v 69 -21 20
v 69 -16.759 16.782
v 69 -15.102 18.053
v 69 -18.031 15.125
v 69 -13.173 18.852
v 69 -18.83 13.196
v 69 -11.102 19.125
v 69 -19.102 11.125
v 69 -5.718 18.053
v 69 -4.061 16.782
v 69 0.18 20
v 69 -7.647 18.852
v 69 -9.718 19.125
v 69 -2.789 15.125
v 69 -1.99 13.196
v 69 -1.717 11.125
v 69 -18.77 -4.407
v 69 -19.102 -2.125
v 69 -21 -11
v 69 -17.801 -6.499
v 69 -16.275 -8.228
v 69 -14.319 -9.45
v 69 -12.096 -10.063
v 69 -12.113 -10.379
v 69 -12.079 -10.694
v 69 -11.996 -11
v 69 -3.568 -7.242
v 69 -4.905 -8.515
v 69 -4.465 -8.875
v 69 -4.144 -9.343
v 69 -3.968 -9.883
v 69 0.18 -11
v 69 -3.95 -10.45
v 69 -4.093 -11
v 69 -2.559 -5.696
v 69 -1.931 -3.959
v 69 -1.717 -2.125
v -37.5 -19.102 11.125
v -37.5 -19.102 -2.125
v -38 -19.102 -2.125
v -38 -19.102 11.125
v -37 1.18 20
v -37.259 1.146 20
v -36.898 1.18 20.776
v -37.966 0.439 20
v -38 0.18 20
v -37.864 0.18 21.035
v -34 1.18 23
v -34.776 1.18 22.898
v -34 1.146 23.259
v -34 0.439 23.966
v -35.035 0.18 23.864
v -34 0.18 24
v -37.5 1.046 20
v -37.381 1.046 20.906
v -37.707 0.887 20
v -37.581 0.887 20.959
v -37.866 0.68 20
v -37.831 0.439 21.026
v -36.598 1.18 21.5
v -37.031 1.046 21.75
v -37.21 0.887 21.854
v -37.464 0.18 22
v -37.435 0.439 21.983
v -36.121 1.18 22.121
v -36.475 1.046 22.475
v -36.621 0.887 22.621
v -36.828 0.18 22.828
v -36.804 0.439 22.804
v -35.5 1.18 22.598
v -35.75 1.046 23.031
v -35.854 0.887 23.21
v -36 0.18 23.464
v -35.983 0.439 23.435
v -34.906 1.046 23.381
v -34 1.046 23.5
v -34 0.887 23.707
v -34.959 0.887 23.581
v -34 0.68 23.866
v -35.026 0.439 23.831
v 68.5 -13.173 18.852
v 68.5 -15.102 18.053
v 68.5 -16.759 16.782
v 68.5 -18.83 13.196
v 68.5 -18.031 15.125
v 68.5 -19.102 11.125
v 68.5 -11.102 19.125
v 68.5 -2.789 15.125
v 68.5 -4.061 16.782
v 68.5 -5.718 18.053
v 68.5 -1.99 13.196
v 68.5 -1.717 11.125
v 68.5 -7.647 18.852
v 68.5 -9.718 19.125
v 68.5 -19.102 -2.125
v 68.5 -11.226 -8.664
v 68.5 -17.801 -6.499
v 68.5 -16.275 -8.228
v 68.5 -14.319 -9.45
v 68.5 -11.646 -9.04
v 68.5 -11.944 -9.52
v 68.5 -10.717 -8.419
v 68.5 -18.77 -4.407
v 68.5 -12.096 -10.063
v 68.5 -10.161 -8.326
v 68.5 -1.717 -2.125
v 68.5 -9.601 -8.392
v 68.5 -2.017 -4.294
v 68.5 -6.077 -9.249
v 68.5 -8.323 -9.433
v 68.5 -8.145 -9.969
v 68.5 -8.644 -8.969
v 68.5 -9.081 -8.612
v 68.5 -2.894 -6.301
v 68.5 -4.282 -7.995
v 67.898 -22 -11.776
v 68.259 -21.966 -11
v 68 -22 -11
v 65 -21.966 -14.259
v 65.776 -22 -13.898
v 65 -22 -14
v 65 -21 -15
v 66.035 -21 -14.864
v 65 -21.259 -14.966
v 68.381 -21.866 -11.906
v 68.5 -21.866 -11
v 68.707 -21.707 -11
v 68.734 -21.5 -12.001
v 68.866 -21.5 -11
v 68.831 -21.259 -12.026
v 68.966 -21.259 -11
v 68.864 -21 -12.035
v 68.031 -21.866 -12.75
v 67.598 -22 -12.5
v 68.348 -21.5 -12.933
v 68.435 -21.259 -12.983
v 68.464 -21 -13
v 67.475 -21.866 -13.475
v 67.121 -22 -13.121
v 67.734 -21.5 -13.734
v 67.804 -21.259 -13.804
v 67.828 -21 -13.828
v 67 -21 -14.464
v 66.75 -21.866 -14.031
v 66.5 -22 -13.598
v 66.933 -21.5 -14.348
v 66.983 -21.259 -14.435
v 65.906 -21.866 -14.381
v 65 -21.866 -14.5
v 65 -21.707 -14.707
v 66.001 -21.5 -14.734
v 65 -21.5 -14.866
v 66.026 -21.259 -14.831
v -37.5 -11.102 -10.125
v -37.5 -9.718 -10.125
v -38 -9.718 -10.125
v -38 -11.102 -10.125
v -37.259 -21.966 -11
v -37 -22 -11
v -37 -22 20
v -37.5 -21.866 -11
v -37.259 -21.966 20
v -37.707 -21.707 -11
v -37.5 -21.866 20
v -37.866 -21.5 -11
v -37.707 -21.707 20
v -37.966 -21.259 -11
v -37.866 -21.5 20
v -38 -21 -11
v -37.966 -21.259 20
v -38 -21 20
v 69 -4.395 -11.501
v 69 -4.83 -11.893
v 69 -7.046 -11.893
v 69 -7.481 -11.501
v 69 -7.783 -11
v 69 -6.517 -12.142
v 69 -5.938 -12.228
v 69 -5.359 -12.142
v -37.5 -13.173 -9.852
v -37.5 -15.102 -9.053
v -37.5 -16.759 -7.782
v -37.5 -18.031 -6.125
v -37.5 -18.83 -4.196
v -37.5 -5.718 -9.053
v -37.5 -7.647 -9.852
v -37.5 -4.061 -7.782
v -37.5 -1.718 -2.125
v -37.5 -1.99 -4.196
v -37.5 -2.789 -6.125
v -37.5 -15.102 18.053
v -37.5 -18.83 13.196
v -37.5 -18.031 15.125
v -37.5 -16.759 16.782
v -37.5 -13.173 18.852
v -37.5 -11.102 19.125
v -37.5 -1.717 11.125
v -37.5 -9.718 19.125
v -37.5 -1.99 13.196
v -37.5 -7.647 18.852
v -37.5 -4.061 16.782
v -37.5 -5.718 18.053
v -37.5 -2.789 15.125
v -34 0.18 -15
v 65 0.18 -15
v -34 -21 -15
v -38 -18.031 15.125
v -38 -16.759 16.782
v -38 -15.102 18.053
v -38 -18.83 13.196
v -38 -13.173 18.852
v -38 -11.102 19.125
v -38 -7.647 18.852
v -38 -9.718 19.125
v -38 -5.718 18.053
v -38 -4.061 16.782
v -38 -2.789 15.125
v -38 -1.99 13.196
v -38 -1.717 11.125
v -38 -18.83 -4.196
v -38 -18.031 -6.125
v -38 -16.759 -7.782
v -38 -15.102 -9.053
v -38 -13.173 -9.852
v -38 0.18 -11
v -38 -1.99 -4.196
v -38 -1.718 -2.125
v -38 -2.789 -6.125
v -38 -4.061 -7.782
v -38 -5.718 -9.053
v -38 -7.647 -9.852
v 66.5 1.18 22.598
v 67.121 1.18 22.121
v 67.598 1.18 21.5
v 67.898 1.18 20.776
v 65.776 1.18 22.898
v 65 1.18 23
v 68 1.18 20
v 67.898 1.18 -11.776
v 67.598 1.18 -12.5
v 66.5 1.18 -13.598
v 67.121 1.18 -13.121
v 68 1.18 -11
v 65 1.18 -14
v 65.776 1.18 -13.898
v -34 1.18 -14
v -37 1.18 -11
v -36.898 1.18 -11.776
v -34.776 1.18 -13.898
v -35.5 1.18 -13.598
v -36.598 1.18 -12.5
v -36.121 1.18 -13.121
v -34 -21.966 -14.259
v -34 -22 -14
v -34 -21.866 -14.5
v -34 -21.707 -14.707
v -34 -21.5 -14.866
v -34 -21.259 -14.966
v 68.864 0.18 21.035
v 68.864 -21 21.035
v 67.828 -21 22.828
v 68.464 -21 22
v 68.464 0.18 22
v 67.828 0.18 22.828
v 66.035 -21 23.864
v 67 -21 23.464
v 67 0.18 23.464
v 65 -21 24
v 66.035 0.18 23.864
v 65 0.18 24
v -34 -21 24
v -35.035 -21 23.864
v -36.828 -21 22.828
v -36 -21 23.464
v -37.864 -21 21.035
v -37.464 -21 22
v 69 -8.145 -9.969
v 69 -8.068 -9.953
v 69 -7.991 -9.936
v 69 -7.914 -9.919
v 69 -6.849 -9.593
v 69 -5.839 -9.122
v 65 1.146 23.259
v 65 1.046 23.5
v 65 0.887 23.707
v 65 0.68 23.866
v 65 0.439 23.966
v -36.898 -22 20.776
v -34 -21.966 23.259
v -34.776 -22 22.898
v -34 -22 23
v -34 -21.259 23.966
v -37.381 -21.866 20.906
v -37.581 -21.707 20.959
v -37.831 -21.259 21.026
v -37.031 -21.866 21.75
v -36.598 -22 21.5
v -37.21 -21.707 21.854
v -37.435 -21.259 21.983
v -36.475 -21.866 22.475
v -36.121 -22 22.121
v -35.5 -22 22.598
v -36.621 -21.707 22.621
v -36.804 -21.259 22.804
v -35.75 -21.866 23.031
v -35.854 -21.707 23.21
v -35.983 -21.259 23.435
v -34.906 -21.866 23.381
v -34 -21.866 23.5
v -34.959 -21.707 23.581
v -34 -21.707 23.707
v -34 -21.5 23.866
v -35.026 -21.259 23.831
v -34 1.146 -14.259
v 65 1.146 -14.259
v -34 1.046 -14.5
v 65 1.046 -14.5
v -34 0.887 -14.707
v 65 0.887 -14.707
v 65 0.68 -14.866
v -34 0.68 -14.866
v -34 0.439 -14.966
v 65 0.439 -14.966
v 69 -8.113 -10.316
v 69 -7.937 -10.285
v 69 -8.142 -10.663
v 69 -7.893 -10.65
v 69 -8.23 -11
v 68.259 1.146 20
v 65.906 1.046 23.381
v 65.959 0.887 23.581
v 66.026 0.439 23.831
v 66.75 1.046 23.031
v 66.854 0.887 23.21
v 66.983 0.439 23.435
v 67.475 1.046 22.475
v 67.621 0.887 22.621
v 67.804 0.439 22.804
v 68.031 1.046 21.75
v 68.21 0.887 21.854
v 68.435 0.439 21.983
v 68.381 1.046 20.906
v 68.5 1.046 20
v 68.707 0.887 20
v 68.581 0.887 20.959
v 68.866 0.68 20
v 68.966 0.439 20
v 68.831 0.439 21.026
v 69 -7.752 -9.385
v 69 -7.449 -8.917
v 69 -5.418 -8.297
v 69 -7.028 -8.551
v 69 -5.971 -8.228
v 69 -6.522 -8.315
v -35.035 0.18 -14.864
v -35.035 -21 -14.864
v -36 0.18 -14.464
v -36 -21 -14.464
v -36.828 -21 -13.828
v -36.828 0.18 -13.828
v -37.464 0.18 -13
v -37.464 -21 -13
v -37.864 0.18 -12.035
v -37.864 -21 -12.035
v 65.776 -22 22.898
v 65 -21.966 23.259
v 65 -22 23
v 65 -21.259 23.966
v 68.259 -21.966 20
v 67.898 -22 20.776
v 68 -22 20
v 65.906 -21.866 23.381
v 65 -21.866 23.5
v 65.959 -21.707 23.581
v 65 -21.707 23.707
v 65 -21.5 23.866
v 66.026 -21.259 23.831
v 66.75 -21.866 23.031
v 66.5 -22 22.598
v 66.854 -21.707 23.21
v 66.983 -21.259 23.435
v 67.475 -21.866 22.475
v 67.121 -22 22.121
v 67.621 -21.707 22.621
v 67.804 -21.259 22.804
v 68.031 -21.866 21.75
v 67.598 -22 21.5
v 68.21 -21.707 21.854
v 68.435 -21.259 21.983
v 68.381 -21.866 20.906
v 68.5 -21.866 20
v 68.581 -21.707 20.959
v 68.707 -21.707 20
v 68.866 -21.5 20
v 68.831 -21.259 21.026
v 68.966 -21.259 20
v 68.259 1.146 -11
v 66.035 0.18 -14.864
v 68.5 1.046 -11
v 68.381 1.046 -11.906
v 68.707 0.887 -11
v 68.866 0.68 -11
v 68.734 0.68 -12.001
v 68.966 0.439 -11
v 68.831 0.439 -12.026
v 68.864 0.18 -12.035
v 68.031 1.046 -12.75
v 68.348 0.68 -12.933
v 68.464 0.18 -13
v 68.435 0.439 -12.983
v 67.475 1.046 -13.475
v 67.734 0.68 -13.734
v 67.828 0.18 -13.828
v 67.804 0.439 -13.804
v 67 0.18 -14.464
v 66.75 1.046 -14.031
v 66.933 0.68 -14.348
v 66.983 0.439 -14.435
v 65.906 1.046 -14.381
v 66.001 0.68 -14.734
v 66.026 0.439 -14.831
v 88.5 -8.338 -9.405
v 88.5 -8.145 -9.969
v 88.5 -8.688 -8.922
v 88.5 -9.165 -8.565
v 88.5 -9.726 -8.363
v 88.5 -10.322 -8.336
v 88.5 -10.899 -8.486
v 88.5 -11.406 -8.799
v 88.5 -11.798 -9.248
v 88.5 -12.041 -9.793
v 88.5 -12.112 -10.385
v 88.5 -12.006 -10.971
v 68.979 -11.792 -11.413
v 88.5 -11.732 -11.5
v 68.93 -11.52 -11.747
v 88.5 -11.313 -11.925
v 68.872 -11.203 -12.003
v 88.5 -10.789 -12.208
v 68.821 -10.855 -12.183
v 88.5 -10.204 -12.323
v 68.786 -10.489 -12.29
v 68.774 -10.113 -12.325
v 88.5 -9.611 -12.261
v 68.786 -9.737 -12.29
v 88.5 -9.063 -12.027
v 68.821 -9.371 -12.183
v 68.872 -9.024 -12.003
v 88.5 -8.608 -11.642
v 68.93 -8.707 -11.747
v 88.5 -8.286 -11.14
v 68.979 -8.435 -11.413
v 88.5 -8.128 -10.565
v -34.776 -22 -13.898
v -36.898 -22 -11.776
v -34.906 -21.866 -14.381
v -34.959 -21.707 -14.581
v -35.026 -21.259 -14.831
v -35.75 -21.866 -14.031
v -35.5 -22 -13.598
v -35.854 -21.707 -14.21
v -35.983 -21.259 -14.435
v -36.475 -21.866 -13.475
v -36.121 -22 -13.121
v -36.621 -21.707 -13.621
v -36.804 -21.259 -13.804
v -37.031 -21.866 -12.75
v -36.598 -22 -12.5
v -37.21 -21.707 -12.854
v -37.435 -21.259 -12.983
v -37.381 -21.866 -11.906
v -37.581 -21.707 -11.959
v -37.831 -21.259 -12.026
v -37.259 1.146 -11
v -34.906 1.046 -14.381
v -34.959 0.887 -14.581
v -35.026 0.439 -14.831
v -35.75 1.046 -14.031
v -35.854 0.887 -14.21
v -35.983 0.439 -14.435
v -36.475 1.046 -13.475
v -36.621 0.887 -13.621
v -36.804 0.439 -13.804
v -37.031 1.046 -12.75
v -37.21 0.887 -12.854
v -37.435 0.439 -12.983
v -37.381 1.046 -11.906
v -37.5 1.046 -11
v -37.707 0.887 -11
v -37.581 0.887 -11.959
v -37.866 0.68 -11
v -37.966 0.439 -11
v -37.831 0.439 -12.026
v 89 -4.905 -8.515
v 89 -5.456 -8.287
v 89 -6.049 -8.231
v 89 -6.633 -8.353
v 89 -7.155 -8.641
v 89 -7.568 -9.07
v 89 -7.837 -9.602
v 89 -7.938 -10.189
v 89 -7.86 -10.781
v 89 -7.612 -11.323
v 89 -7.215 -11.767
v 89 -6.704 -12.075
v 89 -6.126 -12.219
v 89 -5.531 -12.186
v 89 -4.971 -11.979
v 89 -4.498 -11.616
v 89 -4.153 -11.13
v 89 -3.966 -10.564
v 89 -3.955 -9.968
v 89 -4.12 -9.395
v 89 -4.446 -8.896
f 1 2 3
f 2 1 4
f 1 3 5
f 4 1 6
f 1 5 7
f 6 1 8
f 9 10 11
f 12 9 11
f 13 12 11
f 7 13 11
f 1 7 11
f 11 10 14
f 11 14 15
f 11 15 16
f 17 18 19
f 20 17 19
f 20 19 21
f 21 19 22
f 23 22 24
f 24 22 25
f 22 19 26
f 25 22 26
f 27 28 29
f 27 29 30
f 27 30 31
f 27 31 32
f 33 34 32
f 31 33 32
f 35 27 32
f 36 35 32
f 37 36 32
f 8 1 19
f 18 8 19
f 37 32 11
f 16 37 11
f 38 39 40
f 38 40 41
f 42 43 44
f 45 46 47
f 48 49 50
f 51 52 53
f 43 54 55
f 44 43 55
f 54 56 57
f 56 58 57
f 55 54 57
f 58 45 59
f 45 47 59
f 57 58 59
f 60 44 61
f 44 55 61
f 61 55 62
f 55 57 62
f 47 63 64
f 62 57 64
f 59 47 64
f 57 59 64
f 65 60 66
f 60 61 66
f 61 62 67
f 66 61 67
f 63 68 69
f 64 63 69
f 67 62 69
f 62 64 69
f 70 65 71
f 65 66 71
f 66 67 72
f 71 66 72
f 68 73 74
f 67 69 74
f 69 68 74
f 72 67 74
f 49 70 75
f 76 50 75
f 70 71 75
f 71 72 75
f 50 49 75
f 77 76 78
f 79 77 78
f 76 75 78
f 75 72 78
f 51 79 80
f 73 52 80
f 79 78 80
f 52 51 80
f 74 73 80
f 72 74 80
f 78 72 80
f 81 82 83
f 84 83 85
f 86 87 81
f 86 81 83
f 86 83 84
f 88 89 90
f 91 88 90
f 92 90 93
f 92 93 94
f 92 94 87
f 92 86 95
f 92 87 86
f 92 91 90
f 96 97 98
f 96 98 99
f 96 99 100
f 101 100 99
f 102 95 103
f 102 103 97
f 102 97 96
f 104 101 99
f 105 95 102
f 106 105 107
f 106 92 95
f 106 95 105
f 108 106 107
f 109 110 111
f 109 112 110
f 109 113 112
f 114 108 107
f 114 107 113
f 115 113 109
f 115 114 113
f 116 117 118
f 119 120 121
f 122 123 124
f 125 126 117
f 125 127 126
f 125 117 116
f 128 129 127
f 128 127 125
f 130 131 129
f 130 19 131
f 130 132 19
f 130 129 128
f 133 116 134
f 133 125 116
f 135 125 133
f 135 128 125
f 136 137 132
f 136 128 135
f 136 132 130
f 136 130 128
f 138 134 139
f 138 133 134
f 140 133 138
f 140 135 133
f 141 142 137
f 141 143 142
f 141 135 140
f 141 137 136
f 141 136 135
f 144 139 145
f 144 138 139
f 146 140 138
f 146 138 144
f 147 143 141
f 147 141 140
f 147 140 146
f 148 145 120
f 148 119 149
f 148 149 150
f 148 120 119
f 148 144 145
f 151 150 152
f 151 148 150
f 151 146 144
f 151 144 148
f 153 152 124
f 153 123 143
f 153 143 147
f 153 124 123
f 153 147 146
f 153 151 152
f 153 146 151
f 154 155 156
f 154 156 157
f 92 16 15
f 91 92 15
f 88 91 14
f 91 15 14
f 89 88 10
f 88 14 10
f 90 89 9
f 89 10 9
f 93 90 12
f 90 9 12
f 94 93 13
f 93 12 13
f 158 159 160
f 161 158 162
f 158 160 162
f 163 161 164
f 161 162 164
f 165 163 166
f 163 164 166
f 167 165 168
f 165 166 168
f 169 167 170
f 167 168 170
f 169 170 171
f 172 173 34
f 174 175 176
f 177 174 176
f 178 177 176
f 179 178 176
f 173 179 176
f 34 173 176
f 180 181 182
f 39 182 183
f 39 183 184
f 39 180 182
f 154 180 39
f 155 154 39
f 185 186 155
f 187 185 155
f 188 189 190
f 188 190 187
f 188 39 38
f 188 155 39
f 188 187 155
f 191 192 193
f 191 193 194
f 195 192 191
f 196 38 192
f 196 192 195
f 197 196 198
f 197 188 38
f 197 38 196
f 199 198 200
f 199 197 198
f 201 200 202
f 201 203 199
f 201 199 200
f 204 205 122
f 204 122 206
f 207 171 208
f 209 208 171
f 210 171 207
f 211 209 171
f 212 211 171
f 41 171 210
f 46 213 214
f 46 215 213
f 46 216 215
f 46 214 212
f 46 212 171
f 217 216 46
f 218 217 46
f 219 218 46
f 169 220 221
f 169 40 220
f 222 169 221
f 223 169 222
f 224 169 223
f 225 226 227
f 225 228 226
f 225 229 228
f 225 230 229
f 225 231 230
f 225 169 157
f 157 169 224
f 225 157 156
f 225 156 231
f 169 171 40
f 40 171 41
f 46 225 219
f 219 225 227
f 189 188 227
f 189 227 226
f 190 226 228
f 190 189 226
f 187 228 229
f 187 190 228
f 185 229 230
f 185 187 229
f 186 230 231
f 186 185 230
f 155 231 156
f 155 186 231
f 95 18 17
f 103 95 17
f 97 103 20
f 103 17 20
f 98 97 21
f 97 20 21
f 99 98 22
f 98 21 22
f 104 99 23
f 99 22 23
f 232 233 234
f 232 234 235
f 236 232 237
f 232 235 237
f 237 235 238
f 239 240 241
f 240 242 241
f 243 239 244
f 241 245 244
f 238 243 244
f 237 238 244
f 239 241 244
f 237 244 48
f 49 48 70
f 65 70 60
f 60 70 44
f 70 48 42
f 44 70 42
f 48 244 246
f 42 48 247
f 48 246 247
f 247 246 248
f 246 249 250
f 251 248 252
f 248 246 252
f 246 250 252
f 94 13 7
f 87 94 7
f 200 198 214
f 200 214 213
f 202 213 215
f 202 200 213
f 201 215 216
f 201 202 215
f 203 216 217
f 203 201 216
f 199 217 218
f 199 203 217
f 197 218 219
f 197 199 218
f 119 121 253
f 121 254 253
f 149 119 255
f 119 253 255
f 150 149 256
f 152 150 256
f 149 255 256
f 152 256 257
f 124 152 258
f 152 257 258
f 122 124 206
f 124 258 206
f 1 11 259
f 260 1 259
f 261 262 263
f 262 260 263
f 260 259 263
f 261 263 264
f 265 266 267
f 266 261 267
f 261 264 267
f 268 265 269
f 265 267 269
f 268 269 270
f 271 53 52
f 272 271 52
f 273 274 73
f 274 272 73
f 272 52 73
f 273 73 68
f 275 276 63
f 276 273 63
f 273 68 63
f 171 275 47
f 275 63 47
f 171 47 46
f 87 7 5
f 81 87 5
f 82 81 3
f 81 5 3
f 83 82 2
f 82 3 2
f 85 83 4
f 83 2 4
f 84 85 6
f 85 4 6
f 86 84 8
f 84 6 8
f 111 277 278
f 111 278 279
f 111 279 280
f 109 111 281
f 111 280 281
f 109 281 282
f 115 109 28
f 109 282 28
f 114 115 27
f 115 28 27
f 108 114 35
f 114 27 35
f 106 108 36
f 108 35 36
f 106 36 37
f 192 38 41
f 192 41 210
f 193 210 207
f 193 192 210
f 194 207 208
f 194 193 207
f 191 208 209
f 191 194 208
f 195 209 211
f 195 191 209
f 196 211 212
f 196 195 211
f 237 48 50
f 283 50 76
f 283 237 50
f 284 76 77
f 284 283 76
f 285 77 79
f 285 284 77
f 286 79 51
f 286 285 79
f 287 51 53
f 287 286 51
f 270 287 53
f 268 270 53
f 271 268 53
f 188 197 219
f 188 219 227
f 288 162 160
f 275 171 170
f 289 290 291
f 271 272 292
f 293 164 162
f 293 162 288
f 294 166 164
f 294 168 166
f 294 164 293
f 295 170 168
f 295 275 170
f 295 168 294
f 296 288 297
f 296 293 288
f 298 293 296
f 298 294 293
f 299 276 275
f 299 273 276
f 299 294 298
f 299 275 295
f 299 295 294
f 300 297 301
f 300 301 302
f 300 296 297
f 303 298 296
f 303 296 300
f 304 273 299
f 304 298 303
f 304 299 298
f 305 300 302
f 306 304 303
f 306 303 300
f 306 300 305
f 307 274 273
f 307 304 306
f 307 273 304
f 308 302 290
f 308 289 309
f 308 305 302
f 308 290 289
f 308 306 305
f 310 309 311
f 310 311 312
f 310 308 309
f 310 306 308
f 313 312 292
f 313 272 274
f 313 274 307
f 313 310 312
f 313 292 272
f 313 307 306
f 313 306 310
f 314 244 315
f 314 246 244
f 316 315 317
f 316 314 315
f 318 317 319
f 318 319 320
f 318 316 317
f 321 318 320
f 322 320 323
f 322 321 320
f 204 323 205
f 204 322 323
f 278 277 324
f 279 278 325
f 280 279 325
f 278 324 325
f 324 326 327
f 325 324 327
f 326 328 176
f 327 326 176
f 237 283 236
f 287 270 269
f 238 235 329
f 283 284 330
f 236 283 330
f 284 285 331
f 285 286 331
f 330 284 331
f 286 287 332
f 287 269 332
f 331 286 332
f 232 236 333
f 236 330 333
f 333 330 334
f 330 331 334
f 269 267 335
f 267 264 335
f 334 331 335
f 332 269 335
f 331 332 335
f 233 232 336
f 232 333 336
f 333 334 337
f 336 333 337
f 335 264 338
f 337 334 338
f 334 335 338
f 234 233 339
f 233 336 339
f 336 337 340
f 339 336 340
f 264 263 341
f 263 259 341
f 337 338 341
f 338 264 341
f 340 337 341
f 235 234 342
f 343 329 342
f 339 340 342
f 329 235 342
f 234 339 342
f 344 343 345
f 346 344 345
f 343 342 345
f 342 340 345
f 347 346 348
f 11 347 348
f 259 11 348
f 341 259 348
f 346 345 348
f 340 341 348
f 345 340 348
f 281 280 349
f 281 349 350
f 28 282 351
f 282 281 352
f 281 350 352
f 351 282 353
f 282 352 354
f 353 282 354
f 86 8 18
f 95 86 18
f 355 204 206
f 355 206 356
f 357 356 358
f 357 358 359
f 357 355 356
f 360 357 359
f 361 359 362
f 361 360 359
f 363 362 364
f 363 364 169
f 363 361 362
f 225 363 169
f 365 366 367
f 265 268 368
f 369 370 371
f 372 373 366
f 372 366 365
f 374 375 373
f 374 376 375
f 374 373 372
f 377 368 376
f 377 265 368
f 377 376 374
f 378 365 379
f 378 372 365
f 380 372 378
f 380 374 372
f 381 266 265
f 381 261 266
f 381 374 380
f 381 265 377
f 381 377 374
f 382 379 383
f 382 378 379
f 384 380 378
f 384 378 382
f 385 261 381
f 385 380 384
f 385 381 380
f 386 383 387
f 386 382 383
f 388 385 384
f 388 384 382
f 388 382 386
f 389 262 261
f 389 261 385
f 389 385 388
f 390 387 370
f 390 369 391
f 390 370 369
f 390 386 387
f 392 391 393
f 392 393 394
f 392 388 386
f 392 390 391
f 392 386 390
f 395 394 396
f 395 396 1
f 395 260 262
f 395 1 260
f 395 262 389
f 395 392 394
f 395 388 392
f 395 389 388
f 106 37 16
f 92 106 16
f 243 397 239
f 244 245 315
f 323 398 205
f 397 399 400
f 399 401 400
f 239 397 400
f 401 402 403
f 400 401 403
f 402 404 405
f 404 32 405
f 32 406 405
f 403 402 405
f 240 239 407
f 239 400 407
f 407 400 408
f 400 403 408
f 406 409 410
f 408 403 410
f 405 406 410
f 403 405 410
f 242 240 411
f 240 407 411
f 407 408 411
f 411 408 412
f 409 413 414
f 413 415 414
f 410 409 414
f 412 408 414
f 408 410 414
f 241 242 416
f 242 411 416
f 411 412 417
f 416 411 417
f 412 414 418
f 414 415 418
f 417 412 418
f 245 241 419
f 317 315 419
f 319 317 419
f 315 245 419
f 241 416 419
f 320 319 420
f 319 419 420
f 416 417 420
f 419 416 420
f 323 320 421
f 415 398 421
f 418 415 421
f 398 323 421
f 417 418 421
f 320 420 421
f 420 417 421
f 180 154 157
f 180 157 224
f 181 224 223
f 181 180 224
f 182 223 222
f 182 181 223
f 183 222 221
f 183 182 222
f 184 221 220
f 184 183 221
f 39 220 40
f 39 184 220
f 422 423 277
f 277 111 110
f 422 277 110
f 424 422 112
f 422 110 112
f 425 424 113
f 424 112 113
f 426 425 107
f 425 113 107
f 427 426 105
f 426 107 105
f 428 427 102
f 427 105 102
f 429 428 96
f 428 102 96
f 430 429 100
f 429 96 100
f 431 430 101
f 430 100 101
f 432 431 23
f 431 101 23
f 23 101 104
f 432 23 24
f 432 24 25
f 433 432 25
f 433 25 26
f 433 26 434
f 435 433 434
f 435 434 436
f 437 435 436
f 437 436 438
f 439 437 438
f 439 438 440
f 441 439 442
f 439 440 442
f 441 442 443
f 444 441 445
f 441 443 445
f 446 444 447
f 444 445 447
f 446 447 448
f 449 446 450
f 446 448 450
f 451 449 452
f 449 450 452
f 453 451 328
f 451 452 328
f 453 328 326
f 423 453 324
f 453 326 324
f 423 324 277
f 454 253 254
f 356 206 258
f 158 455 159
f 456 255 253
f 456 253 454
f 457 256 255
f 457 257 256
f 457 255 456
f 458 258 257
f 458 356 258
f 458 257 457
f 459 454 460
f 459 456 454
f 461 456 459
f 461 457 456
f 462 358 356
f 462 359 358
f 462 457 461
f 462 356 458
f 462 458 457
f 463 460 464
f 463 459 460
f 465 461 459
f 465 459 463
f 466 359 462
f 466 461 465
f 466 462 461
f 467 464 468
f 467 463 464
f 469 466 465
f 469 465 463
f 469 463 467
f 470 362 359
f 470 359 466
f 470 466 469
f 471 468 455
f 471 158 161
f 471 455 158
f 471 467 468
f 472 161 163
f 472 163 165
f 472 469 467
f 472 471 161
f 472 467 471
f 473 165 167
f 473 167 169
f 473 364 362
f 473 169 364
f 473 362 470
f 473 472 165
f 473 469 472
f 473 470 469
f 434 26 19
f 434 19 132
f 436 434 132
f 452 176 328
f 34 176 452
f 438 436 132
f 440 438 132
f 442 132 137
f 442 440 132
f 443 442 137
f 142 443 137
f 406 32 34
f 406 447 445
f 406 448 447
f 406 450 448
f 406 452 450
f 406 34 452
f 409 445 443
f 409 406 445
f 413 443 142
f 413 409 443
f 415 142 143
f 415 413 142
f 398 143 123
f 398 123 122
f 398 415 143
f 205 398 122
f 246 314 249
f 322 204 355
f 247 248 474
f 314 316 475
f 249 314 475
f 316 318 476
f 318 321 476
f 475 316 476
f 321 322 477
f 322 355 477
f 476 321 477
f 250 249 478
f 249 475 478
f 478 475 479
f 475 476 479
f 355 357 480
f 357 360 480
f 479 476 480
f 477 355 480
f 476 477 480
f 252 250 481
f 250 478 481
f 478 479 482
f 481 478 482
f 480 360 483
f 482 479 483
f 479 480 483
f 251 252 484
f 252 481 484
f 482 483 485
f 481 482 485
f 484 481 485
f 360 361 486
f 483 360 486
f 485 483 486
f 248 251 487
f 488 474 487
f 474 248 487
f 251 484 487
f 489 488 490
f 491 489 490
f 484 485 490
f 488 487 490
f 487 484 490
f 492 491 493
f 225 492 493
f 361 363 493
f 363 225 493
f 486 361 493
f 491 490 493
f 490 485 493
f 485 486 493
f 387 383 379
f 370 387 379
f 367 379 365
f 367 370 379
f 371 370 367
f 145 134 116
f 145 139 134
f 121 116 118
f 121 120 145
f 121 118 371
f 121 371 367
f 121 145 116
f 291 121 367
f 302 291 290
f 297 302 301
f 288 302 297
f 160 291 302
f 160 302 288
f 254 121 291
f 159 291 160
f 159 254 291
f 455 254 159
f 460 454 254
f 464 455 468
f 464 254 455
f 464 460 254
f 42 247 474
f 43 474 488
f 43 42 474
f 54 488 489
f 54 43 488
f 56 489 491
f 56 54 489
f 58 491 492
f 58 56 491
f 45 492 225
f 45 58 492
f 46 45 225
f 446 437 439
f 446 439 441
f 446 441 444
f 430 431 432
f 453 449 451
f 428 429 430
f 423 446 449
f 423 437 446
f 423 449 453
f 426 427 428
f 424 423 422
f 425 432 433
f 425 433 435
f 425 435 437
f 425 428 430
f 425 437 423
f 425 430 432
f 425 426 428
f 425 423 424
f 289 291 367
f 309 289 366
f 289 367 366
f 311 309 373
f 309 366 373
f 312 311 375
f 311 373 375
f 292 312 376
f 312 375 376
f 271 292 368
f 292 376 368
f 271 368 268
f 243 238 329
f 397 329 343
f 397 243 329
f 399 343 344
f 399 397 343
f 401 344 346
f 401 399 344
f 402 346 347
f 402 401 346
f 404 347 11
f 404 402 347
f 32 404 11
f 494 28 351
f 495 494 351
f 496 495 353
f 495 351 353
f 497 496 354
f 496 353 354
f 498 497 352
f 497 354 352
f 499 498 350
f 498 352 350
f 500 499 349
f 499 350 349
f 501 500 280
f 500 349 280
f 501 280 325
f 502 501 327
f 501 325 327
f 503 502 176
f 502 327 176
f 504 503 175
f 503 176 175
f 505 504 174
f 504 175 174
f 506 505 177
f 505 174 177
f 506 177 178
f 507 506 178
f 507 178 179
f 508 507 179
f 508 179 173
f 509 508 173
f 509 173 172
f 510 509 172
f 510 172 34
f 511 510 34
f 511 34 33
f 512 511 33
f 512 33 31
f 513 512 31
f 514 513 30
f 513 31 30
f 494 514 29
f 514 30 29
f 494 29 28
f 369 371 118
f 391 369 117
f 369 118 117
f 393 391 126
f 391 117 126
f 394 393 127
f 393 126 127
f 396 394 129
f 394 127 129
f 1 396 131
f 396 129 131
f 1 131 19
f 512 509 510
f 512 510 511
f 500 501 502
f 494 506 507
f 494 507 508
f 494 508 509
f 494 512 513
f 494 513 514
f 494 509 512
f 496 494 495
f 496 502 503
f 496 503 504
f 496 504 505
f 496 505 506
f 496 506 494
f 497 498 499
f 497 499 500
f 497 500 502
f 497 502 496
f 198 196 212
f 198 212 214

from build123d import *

# Parameters (mm, degrees)
SKETCH1_W           = 107
SKETCH1_H           = 23.18
BOSS_EXTRUDE1_DEPTH = 39
CUT_EXTRUDE1_DEPTH  = 0.5
CUT_EXTRUDE2_START  = -0.5
CUT_EXTRUDE2_DEPTH  = 0.5
FILLET1_R           = 4
FILLET2_R           = 1
SKETCH5_R           = 2
BOSS_EXTRUDE2_DEPTH = 20
SKETCH7_R           = 2
BOSS_EXTRUDE3_DEPTH = 20


with BuildPart() as part:
    # Sketch1 → Boss-Extrude1 (new body)
    with BuildSketch(Plane(origin=(0, 0, -15), x_dir=(-1, 0, 0), z_dir=(0, 0, -1))):
        with Locations((-15.5, -10.41)):
            Rectangle(SKETCH1_W, SKETCH1_H)
    extrude(amount=-BOSS_EXTRUDE1_DEPTH)

    # Sketch2 → Cut-Extrude1 (cut)
    with BuildSketch(Plane(origin=(69, 0, 0), x_dir=(0, 0, -1), z_dir=(1, 0, 0))):
        with BuildLine():
            Line((-19.125, -9.7175), (-19.125, -11.1025))
            ThreePointArc((-19.125, -11.1025), (-16.781854249, -16.759354249), (-11.125, -19.1025))
            Line((-11.125, -19.1025), (2.125, -19.1025))
            ThreePointArc((2.125, -19.1025), (7.781854249, -16.759354249), (10.125, -11.1025))
            Line((10.125, -11.1025), (10.125, -9.7175))
            ThreePointArc((10.125, -9.7175), (7.781854249, -4.060645751), (2.125, -1.7175))
            Line((2.125, -1.7175), (-11.125, -1.7175))
            ThreePointArc((-11.125, -1.7175), (-16.781854249, -4.060645751), (-19.125, -9.7175))
        make_face()
    extrude(amount=-CUT_EXTRUDE1_DEPTH, mode=Mode.SUBTRACT)

    # Sketch3 → Cut-Extrude2 (cut)
    with BuildSketch(Plane.ZY.offset(38).offset(CUT_EXTRUDE2_START)):
        with BuildLine():
            Line((11.125, -1.7175), (-2.125, -1.7175))
            ThreePointArc((-2.125, -1.7175), (-7.781854249, -4.060645751), (-10.125, -9.7175))
            Line((-10.125, -9.7175), (-10.125, -11.1025))
            ThreePointArc((-10.125, -11.1025), (-7.781854249, -16.759354249), (-2.125, -19.1025))
            Line((-2.125, -19.1025), (11.125, -19.1025))
            ThreePointArc((11.125, -19.1025), (16.781854249, -16.759354249), (19.125, -11.1025))
            Line((19.125, -11.1025), (19.125, -9.7175))
            ThreePointArc((19.125, -9.7175), (16.781854249, -4.060645751), (11.125, -1.7175))
        make_face()
    extrude(amount=CUT_EXTRUDE2_DEPTH, mode=Mode.SUBTRACT)

    # Fillet1
    fillet1_edges = [part.edges().sort_by_distance(p)[0] for p in [
        (-38, -10.41, 24),
        (69, -10.41, 24),
        (-38, -10.41, -15),
        (69, -10.41, -15),
    ]]
    fillet(fillet1_edges, radius=FILLET1_R)

    # Fillet2
    fillet2_edges = [part.edges().sort_by_distance(p)[0] for p in [
        (15.5, -22, -15),
        (15.5, 1.18, -15),
        (-38, 1.18, 4.5),
        (15.5, 1.18, 24),
        (69, 1.18, 4.5),
        (67.828427125, 1.18, 22.828427125),
        (67.828427125, 1.18, -13.828427125),
        (-36.828427125, 1.18, 22.828427125),
        (-36.828427125, 1.18, -13.828427125),
        (-38, -22, 4.5),
        (69, -22, 4.5),
        (15.5, -22, 24),
        (67.828427125, -22, 22.828427125),
        (67.828427125, -22, -13.828427125),
        (-36.828427125, -22, 22.828427125),
        (-36.828427125, -22, -13.828427125),
    ]]
    fillet(fillet2_edges, radius=FILLET2_R)

    # Sketch5 → Boss-Extrude2 (add)
    with BuildSketch(Plane(origin=(69, 0, 0), x_dir=(0, 0, -1), z_dir=(1, 0, 0))):
        with Locations(Location((10.227970674, -5.937982546, 0), (0, 0, 148.897384026))):
            Circle(SKETCH5_R)
    extrude(amount=BOSS_EXTRUDE2_DEPTH)

    # Sketch7 → Boss-Extrude3 (add)
    with BuildSketch(Plane(origin=(68.5, 0, 0), x_dir=(0, 0, -1), z_dir=(1, 0, 0))):
        with Locations(Location((10.325411399, -10.113287546, 0), (0, 0, 100.265525012))):
            Circle(SKETCH7_R)
    extrude(amount=BOSS_EXTRUDE3_DEPTH)


solid = part.part
